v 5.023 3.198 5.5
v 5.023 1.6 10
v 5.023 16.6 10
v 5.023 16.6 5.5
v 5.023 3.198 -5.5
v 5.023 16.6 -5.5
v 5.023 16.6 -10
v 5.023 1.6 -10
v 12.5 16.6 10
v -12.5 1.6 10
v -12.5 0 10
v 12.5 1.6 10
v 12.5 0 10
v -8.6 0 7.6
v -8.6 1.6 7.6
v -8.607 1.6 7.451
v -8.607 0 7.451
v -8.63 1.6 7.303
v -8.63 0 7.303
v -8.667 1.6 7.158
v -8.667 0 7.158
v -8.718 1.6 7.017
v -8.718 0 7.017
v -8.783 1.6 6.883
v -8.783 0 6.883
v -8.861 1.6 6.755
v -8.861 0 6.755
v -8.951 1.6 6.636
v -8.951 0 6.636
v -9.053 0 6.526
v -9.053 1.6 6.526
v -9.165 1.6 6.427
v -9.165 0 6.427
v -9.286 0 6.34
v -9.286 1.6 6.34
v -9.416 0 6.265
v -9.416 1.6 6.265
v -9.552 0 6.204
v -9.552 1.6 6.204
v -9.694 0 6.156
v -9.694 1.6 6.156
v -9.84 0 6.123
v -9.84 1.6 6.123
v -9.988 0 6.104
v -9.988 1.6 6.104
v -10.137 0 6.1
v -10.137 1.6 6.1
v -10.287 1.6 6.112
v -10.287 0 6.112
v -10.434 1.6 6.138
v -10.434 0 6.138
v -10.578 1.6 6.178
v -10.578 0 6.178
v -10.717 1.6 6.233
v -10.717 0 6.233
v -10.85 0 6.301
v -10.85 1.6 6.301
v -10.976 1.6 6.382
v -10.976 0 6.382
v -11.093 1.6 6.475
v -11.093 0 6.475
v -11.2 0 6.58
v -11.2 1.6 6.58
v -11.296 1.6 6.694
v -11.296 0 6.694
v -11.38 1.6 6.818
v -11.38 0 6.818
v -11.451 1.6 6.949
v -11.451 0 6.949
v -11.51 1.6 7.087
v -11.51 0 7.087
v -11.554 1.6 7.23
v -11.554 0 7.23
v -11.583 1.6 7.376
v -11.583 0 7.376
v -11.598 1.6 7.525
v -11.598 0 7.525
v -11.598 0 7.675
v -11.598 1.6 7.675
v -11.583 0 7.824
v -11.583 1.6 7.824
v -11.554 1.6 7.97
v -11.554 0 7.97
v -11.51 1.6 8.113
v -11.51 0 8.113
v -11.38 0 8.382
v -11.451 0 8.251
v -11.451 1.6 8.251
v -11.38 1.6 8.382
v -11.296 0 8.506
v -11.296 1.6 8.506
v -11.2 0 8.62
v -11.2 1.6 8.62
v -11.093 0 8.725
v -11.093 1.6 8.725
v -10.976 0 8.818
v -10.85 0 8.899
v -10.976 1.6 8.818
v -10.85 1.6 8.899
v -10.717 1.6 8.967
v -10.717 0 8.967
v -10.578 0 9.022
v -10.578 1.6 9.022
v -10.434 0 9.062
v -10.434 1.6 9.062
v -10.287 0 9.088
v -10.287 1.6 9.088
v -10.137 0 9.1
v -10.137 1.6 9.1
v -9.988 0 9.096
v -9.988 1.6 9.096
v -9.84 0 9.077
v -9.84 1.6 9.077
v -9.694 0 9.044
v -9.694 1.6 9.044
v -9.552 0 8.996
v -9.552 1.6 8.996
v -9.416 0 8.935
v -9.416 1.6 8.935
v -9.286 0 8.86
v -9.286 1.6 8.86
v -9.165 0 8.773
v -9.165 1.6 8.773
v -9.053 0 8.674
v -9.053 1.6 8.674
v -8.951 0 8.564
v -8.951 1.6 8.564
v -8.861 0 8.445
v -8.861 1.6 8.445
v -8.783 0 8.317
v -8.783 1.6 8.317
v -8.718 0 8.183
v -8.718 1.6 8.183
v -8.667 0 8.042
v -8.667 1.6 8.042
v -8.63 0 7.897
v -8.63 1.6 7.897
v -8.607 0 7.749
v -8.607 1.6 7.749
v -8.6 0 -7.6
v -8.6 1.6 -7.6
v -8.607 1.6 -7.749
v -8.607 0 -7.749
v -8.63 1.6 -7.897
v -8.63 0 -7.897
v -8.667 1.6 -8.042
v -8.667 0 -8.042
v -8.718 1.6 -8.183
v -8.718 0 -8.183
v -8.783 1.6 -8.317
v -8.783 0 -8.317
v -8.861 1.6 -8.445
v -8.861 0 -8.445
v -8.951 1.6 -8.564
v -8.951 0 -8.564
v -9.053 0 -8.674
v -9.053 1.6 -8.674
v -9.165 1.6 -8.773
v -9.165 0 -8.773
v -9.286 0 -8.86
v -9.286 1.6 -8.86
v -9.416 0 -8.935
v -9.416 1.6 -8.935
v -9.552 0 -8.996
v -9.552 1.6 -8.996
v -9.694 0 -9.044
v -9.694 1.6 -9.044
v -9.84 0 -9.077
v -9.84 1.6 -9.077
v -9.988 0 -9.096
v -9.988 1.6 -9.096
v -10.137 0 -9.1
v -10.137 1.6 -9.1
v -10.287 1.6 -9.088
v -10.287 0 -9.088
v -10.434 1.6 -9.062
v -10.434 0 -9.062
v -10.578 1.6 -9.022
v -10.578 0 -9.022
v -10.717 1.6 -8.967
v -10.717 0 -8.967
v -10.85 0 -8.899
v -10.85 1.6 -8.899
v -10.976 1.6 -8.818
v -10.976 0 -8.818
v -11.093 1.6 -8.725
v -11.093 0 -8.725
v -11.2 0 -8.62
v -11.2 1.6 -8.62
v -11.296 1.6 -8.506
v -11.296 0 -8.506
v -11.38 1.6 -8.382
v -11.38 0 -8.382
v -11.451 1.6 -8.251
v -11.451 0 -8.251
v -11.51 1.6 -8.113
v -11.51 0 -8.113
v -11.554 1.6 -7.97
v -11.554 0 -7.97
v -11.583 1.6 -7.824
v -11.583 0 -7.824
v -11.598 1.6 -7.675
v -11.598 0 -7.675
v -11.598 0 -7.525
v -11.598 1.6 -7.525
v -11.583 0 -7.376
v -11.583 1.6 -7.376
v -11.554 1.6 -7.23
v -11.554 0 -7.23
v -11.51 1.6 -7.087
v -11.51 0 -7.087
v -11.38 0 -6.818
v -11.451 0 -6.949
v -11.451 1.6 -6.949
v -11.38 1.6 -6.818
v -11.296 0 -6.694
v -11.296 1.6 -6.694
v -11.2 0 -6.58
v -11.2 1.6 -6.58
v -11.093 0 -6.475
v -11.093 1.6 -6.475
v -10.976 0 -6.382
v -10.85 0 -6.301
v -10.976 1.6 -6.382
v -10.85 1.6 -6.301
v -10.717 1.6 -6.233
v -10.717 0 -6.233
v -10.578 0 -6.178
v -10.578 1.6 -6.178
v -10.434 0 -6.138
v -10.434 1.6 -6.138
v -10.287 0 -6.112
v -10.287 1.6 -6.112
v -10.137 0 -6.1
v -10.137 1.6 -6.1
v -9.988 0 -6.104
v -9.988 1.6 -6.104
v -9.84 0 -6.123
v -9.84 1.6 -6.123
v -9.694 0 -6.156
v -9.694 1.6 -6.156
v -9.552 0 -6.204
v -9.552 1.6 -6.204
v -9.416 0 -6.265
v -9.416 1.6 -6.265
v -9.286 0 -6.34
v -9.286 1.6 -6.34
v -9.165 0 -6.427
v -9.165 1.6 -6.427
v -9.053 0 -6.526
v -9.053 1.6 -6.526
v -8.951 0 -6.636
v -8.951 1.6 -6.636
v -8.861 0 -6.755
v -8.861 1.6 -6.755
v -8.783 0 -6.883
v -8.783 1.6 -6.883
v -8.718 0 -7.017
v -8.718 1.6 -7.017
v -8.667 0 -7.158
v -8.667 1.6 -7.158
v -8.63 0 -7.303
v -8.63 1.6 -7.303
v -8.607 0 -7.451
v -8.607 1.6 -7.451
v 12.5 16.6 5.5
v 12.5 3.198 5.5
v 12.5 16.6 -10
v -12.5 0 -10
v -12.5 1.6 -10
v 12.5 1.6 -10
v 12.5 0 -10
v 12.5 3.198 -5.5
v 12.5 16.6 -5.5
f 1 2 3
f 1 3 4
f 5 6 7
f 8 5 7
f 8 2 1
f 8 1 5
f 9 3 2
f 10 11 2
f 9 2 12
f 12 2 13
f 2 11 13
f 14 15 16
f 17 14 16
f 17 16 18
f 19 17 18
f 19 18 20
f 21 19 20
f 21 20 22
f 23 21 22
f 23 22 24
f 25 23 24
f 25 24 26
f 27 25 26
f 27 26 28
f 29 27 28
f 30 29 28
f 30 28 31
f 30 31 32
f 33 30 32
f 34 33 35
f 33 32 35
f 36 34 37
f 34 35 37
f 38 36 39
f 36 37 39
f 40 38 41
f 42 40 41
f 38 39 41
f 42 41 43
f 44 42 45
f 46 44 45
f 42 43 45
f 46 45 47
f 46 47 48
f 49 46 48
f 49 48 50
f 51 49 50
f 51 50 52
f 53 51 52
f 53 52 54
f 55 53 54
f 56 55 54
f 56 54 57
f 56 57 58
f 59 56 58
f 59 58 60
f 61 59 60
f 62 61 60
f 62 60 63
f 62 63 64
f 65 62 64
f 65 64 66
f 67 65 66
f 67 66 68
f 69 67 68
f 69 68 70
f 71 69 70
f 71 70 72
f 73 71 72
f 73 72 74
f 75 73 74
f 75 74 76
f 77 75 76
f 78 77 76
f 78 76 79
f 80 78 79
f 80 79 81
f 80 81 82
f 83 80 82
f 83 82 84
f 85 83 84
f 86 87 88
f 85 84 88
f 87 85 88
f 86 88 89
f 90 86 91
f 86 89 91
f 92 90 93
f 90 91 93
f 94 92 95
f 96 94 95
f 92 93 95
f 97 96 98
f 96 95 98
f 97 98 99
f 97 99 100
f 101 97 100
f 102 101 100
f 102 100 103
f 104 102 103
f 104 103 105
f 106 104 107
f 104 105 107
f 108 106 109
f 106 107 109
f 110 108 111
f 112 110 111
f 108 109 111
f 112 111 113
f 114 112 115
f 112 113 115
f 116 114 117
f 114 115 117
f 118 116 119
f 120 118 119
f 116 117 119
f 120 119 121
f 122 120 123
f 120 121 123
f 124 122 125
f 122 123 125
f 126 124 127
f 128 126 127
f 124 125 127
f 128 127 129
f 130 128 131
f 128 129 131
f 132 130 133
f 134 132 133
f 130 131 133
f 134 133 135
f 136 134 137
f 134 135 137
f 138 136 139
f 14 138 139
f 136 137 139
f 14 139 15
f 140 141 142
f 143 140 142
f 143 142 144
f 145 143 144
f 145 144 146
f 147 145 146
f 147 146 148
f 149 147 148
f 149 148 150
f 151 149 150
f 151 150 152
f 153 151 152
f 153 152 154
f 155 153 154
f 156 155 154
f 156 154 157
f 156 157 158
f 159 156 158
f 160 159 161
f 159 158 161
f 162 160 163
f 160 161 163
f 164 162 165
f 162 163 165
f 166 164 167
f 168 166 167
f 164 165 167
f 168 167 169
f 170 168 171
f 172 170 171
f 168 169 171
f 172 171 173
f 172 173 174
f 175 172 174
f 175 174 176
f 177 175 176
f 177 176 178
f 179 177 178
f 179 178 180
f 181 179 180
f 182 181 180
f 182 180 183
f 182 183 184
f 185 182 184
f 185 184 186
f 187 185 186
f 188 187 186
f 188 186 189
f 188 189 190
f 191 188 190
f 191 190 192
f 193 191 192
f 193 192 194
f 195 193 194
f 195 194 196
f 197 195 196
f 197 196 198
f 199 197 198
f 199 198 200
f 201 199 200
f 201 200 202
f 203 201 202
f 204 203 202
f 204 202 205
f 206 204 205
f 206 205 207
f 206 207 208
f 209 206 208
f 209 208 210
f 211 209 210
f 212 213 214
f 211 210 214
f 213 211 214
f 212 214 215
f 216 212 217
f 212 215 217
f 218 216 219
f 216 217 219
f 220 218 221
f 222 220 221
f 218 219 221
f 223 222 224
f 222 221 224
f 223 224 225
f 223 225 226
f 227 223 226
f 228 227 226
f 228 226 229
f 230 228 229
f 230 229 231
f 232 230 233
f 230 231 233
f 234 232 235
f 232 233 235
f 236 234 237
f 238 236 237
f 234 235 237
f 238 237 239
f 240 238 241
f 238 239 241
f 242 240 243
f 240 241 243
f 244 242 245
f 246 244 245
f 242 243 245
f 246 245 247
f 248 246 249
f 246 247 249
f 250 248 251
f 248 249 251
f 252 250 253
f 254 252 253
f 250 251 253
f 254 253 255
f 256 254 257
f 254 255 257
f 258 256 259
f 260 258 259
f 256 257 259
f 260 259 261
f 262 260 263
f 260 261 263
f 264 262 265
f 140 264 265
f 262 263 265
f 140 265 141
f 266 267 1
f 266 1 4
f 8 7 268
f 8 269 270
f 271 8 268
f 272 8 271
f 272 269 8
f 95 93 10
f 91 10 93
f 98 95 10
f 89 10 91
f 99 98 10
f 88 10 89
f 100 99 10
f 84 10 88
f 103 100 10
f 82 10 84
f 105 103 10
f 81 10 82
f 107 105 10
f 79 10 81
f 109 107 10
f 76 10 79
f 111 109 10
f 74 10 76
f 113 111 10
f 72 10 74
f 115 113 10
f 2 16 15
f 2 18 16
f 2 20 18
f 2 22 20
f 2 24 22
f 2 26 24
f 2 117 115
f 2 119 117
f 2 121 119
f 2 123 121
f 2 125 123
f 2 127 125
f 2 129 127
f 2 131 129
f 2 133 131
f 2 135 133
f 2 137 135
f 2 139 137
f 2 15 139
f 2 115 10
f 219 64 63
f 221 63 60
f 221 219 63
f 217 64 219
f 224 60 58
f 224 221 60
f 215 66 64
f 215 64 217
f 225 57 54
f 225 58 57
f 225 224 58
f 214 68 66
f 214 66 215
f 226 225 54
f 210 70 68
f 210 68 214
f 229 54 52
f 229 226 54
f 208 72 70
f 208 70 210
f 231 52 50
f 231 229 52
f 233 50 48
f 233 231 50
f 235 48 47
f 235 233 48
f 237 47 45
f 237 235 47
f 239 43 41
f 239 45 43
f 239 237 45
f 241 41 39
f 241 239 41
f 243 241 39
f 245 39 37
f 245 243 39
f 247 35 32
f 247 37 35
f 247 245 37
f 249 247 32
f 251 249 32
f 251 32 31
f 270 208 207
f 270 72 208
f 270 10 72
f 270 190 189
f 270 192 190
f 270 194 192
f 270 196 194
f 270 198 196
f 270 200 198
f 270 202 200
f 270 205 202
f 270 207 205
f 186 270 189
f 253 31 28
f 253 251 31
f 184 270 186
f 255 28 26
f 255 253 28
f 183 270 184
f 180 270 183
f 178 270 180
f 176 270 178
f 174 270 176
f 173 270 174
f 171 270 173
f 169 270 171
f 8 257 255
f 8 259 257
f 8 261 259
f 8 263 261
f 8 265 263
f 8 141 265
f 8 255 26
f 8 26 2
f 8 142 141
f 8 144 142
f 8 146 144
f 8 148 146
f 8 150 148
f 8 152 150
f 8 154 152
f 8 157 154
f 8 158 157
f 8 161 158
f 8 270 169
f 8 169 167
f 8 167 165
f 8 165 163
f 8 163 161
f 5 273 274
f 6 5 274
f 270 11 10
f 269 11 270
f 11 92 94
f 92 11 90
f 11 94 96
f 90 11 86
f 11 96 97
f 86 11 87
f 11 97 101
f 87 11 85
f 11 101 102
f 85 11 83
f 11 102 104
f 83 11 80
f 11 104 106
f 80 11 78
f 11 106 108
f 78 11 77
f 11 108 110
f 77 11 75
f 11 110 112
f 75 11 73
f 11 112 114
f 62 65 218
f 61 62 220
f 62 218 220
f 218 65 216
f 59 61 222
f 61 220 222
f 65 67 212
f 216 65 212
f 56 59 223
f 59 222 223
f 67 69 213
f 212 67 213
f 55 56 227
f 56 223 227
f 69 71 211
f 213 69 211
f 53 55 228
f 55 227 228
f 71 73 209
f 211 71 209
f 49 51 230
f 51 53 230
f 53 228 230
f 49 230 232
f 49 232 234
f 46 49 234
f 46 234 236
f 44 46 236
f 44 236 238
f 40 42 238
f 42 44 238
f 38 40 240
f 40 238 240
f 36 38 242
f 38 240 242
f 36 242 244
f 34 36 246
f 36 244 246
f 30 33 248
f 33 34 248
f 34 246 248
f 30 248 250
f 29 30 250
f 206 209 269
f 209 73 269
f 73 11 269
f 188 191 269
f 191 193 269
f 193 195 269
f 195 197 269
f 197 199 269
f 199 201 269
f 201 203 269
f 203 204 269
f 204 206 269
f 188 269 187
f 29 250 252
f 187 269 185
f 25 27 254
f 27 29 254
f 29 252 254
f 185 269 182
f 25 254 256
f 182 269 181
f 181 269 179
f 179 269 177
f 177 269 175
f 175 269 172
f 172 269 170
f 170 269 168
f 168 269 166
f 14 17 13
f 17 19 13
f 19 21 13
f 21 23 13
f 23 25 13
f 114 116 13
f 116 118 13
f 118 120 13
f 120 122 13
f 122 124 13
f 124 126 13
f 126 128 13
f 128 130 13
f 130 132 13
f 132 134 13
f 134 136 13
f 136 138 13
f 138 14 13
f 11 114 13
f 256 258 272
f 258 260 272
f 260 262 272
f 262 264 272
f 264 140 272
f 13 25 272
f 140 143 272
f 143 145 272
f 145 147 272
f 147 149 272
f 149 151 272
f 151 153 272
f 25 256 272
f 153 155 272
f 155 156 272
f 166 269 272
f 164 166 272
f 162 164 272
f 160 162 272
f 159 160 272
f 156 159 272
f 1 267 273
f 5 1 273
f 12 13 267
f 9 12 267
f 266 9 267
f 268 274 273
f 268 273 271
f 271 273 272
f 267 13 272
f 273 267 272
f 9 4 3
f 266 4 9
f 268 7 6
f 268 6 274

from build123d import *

# Parameters (mm, degrees)
SKETCH1_W           = 25
SKETCH1_H           = 20
BOSS_EXTRUDE1_DEPTH = 1.6
SKETCH2_W           = 7.477117313
SKETCH2_H           = 20
BOSS_EXTRUDE2_DEPTH = 15
SKETCH3_W           = 11
SKETCH3_H           = 13.40236223
CUT_EXTRUDE1_DEPTH  = 15
SKETCH4_R           = 1.5
CUT_EXTRUDE2_DEPTH  = 15


with BuildPart() as part:
    # Sketch1 → Boss-Extrude1 (new body)
    with BuildSketch(Plane(origin=(0, 0, 0), x_dir=(1, 0, 0), z_dir=(0, 1, 0))):
        Rectangle(SKETCH1_W, SKETCH1_H)
    extrude(amount=BOSS_EXTRUDE1_DEPTH)

    # Sketch2 → Boss-Extrude2 (add)
    with BuildSketch(Plane(origin=(0, 1.6, 0), x_dir=(1, 0, 0), z_dir=(0, 1, 0))):
        with Locations((8.761441343, 0)):
            Rectangle(SKETCH2_W, SKETCH2_H)
    extrude(amount=BOSS_EXTRUDE2_DEPTH)

    # Sketch3 → Cut-Extrude1 (cut)
    with BuildSketch(Plane(origin=(12.5, 0, 0), x_dir=(0, 0, -1), z_dir=(1, 0, 0))):
        with Locations((0, 9.898818885)):
            Rectangle(SKETCH3_W, SKETCH3_H)
    extrude(amount=-CUT_EXTRUDE1_DEPTH, mode=Mode.SUBTRACT)

    # Sketch4 → Cut-Extrude2 (cut)
    with BuildSketch(Plane(origin=(0, 1.6, 0), x_dir=(1, 0, 0), z_dir=(0, 1, 0))):
        with Locations((-10.1, 7.6)):
            Circle(SKETCH4_R)
        with Locations((-10.1, -7.6)):
            Circle(SKETCH4_R)
    extrude(amount=-CUT_EXTRUDE2_DEPTH, mode=Mode.SUBTRACT)


solid = part.part
